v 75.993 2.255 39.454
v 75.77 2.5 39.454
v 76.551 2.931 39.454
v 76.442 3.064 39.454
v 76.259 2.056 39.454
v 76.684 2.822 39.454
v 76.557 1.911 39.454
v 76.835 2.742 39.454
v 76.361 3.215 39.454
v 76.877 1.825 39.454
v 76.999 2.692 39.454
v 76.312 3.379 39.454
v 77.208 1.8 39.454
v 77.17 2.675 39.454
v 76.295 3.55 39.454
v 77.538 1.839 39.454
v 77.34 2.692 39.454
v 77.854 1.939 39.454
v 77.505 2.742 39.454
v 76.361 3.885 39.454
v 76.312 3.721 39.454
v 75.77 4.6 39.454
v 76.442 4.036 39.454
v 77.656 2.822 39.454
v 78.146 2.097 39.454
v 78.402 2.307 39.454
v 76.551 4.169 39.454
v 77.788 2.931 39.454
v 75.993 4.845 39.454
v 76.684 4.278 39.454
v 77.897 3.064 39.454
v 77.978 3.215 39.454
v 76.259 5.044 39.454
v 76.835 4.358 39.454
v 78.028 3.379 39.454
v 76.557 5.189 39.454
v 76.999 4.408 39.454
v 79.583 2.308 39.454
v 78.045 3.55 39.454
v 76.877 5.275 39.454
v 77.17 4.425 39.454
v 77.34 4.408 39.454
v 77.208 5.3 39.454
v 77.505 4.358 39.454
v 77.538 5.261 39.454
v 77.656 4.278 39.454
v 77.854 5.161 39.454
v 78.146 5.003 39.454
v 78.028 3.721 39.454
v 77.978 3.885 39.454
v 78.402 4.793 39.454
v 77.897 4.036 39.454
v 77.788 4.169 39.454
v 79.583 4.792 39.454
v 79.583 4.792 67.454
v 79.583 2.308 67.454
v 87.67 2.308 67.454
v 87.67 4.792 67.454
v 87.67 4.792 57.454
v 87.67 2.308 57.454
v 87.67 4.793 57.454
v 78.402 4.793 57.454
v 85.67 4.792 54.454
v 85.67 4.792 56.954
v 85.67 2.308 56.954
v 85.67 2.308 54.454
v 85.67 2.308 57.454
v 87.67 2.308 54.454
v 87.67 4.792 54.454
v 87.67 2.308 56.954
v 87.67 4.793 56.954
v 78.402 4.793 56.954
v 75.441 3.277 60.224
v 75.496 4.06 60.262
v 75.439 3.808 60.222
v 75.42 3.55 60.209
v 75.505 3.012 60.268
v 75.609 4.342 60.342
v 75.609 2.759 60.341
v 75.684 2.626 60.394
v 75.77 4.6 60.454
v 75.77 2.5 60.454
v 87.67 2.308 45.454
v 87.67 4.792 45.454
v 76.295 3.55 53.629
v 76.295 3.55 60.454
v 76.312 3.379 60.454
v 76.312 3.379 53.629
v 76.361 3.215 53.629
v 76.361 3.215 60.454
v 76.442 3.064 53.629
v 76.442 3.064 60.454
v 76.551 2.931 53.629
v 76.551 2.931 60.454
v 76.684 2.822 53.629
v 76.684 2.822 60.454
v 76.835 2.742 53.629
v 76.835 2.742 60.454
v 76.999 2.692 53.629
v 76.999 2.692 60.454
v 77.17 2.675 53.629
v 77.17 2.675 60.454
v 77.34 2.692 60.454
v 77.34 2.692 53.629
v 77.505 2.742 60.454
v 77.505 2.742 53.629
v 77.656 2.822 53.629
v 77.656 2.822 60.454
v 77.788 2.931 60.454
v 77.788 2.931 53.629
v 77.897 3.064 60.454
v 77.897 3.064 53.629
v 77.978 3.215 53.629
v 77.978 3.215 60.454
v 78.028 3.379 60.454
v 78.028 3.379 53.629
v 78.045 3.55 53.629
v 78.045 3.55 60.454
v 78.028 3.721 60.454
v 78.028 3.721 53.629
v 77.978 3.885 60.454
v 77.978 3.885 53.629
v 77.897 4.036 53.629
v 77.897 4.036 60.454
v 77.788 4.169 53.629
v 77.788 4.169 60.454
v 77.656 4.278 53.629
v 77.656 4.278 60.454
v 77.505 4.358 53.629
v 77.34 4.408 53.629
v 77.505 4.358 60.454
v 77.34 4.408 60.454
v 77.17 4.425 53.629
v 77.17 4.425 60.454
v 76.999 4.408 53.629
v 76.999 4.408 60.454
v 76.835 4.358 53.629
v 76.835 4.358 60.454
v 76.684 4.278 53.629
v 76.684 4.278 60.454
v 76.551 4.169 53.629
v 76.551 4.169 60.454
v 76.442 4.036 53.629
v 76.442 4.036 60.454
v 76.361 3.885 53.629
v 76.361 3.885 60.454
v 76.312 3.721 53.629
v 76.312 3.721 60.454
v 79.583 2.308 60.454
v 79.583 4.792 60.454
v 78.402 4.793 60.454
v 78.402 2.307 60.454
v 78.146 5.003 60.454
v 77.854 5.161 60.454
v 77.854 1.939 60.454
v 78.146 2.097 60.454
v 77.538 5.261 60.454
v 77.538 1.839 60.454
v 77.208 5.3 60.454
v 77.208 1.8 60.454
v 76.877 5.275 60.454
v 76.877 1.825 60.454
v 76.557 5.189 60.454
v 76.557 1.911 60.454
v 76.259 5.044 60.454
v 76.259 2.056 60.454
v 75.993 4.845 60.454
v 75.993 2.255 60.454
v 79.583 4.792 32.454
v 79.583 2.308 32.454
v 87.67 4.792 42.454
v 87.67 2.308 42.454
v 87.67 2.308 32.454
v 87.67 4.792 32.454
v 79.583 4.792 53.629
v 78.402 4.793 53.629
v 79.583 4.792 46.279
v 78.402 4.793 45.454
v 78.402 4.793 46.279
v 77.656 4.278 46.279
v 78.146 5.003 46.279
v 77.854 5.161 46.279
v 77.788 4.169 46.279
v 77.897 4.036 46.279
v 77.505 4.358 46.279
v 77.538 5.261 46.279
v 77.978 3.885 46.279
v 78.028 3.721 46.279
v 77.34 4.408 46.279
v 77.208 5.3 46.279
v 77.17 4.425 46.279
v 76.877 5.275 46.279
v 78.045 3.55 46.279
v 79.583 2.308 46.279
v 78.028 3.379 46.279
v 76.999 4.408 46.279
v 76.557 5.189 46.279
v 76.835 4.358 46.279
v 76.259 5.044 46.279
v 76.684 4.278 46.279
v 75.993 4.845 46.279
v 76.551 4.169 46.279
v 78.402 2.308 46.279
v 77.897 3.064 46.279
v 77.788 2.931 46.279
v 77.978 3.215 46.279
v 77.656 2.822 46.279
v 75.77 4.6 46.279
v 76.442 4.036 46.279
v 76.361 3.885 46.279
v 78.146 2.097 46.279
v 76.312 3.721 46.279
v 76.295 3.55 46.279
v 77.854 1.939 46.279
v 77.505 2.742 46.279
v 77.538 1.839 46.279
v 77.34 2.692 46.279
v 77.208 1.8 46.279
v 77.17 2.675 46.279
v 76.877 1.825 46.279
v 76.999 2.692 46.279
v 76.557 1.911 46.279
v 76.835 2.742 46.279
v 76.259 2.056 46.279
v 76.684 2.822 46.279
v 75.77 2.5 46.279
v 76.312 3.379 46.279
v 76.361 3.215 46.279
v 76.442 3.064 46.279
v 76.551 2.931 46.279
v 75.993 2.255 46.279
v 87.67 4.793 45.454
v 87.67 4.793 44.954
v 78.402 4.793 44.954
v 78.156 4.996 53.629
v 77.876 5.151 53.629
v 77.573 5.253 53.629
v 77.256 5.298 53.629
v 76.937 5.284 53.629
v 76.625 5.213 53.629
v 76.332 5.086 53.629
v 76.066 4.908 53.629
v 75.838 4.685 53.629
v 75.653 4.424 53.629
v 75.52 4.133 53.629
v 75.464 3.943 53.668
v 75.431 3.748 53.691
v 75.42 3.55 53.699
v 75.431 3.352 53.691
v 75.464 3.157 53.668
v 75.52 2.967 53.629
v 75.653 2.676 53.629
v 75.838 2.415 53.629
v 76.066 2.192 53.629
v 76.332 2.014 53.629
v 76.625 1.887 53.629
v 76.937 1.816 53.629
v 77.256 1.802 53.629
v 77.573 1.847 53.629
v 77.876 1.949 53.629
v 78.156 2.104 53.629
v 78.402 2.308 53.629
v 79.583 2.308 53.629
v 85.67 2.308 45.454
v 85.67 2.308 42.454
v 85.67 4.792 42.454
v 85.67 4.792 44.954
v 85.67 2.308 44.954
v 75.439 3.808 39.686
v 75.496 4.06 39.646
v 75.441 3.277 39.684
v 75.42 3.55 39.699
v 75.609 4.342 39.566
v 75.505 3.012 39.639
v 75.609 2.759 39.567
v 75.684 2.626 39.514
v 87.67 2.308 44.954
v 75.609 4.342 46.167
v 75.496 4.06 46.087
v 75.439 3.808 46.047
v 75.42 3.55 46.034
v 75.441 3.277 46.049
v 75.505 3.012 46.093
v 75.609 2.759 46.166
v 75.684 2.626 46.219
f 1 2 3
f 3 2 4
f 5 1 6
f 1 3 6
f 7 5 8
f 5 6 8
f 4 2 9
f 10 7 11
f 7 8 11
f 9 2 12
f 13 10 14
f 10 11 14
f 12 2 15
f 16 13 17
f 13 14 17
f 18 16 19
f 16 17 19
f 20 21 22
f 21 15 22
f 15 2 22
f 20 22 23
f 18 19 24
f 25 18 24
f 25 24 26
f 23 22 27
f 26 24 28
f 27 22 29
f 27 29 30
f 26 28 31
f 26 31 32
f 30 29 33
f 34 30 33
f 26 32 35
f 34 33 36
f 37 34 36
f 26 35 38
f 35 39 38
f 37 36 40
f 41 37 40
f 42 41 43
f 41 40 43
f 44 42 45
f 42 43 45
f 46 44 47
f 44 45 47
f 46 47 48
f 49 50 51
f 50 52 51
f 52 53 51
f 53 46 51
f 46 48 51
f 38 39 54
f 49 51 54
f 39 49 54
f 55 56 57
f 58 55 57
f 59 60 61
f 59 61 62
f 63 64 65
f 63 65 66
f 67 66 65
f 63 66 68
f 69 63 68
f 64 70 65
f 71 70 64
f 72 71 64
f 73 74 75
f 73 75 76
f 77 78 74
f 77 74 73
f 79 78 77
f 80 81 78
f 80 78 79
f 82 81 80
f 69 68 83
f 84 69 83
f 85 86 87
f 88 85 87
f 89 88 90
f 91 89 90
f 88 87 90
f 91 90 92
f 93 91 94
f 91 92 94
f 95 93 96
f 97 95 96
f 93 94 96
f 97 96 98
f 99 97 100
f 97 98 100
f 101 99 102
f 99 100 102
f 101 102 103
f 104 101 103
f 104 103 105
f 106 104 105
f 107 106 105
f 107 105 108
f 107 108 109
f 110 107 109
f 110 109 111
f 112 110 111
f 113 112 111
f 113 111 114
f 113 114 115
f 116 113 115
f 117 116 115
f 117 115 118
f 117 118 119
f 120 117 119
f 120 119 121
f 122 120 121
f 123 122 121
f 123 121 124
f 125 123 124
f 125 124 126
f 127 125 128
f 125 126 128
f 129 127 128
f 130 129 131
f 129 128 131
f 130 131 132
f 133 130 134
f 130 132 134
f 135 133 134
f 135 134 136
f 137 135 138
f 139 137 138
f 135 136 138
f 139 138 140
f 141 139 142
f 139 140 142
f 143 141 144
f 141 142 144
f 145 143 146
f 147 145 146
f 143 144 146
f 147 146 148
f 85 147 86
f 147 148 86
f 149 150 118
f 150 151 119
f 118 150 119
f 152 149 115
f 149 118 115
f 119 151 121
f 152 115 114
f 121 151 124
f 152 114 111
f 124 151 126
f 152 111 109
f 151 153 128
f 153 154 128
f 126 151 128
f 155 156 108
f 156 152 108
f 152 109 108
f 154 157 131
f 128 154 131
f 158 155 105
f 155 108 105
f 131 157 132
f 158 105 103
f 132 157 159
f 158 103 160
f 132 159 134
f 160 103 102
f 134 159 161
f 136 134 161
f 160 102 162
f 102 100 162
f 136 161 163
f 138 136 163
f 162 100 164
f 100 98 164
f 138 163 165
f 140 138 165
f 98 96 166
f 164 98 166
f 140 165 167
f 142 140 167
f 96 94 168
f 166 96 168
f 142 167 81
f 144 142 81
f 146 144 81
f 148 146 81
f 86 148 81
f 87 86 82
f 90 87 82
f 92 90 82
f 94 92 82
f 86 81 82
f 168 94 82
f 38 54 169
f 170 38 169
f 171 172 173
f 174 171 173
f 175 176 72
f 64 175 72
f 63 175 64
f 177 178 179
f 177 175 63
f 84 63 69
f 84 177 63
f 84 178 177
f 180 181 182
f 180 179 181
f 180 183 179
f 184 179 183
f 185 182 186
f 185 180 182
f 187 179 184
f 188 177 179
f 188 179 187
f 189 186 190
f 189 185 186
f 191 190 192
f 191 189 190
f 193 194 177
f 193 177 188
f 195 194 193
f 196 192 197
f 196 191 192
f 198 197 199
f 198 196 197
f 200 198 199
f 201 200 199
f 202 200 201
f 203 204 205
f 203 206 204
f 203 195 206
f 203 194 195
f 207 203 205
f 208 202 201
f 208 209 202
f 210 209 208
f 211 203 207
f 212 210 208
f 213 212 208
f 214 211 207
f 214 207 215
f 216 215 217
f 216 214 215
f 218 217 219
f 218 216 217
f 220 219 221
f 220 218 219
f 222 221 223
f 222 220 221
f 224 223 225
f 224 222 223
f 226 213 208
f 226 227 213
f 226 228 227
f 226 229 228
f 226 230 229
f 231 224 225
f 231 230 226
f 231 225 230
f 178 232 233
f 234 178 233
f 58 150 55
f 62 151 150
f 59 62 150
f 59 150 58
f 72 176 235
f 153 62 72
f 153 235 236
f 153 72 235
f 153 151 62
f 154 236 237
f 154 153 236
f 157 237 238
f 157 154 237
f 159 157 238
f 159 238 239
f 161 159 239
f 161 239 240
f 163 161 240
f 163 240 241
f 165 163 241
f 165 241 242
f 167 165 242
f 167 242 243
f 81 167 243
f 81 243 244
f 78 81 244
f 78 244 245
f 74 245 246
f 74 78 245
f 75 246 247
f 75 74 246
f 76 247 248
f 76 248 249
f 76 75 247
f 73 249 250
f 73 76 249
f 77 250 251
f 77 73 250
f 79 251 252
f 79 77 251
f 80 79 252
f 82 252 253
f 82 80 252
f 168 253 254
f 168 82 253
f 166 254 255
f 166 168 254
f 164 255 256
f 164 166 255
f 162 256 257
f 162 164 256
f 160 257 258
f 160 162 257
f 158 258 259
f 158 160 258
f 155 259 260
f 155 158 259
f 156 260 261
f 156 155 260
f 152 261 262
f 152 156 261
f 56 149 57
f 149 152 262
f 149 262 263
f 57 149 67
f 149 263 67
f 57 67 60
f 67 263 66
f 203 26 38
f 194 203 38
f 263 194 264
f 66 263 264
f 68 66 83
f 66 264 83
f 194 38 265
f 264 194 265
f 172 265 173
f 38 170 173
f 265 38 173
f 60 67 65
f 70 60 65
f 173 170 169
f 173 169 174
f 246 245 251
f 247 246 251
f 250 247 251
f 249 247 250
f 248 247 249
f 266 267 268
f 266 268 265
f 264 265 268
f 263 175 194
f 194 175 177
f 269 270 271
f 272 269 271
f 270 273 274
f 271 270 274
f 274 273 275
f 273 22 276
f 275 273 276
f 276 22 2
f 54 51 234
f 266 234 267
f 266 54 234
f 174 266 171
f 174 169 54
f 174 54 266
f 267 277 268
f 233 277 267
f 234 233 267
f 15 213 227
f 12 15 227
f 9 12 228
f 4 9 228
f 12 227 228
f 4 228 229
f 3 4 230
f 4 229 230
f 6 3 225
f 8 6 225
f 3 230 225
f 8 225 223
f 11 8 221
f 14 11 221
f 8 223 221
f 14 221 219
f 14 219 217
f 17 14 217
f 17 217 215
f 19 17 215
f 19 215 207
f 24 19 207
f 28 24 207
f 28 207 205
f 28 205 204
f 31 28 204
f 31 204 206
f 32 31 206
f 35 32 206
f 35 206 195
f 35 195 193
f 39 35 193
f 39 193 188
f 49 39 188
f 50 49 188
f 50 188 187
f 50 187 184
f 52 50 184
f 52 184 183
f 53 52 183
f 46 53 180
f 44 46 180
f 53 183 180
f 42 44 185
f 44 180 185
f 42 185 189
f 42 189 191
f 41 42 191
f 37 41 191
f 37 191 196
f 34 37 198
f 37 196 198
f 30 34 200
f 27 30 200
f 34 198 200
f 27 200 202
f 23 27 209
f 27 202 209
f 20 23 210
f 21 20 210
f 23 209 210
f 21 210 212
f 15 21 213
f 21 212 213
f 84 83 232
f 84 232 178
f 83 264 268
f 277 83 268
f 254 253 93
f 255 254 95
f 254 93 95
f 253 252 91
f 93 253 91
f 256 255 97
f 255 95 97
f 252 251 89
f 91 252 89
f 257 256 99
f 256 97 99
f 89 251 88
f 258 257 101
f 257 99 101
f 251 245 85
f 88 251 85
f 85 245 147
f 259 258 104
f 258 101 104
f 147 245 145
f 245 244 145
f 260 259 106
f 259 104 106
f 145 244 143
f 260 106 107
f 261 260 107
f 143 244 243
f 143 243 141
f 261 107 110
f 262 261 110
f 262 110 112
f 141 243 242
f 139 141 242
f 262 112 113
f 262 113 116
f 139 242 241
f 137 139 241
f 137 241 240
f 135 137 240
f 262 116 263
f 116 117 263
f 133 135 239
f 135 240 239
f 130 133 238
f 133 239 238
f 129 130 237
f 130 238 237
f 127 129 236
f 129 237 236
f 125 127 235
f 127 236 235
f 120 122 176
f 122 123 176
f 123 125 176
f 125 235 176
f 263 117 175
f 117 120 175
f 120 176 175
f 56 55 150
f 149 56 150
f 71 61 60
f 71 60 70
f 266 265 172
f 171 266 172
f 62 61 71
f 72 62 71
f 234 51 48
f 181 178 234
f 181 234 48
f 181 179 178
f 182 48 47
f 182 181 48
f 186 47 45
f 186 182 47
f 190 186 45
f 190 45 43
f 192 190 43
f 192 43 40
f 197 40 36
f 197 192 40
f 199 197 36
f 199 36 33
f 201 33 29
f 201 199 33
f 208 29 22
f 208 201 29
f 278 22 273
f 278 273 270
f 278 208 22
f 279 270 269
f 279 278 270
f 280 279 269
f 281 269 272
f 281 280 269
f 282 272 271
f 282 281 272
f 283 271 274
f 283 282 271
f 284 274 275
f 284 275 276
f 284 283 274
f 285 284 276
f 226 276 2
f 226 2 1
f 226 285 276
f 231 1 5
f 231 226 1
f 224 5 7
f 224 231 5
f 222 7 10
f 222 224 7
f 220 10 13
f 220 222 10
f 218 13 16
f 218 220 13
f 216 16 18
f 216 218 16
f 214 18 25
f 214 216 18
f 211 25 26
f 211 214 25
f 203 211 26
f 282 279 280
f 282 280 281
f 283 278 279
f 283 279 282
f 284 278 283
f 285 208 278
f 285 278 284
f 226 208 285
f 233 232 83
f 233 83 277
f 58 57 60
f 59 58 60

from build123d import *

# Parameters (mm, degrees)
SKETCH5_W                = 30
SKETCH5_H                = 100
BOSS_EXTRUDE2_DEPTH      = 7.1
SKETCH7_W                = 6.895
SKETCH7_H                = 20
SKETCH7_H_2              = 21
CUT_EXTRUDE2_DEPTH       = 140.379819119
SKETCH8_W                = 60
SKETCH8_H                = 5
SPLIT2_SURFACE_1_BACK    = 107.419
SPLIT2_SURFACE_1_DEPTH   = 214.838
SKETCH10_R               = 2.5
CUT_EXTRUDE5_DEPTH       = 20
CUT_EXTRUDE5_DEPTH_BACK  = 67
CUT_EXTRUDE7_DEPTH       = 140.461200617
CUT_EXTRUDE7_DEPTH_BACK  = 140.461200617
SKETCH41_W               = 15.603241914
SKETCH41_H               = 21
CUT_EXTRUDE9_DEPTH       = 140.461200617
CUT_EXTRUDE9_DEPTH_BACK  = 140.461200617
SCALE1_SCALE             = 0.35
SKETCH46_W               = 2
SKETCH46_H               = 3
CUT_EXTRUDE10_DEPTH      = 111.657018213
CUT_EXTRUDE10_DEPTH_BACK = 111.657018213
BOSS_EXTRUDE3_REACH      = 70.762
SKETCH47_W               = 0.5
SKETCH47_H               = 2.485


with BuildPart() as part:
    # Sketch5 → Boss-Extrude2 (new body)
    with BuildSketch(Plane(origin=(0, 0, 0), x_dir=(1, 0, 0), z_dir=(0, 1, 0))):
        with Locations((81.879400831, -49.953517558)):
            Rectangle(SKETCH5_W, SKETCH5_H)
    extrude(amount=BOSS_EXTRUDE2_DEPTH)

    # Sketch7 → Cut-Extrude2 (cut, through all)
    with BuildSketch(Plane(origin=(0, 7.1, 0), x_dir=(1, 0, 0), z_dir=(0, 1, 0))):
        with Locations((70.326900831, -9.953517558)):
            Rectangle(SKETCH7_W, SKETCH7_H)
        with Locations((70.326900831, -49.953517558)):
            Rectangle(SKETCH7_W, SKETCH7_H_2)
        with Locations((70.326900831, -89.953517558)):
            Rectangle(SKETCH7_W, SKETCH7_H)
    extrude(amount=-CUT_EXTRUDE2_DEPTH, mode=Mode.SUBTRACT)

    # Sketch8 → Revolve-Thin2 (revolve)
    with BuildSketch(Plane.ZY.offset(-66.879400831), mode=Mode.PRIVATE) as revolve_thin2_sk:
        with Locations((49.953517558, 6.05)):
            Rectangle(SKETCH8_W, SKETCH8_H)
    revolve(revolve_thin2_sk.sketch.rotate(Axis((66.879400831, 3.55, 19.953517558), (0, 0, 1)), 315.234915329), axis=Axis((66.879400831, 3.55, 19.953517558), (0, 0, 1)))

    # Split2: cut with a surface, the side behind it stays
    # Split2 surface: a surface, the sketch's curves swept straight by 214.838 mm
    with BuildLine(Plane(origin=(0, 7.1, 0), x_dir=(1, 0, 0), z_dir=(0, 1, 0)).offset(-SPLIT2_SURFACE_1_BACK), mode=Mode.PRIVATE) as split2_surface_1_path:
        Line((71.879400831, -39.453517558), (61.879400831, -39.453517558))
        Line((61.879400831, -39.453517558), (61.879400831, -59.953517558))
        Line((61.879400831, -59.953517558), (71.879400831, -59.953517558))
        Line((71.879400831, -59.953517558), (71.879400831, -39.453517558))
    split2_surface_1 = Shell.extrude(split2_surface_1_path.wire(), (0 * SPLIT2_SURFACE_1_DEPTH, 1 * SPLIT2_SURFACE_1_DEPTH, 0 * SPLIT2_SURFACE_1_DEPTH))
    split(bisect_by=split2_surface_1, keep=Keep.BOTTOM)

    # Sketch10 → Cut-Extrude5 (cut, two sides)
    with BuildSketch(Plane.XY.offset(79.953517558)) as cut_extrude5_sk:
        with Locations(Location((66.879400831, 3.55, 0), (0, 0, 180))):
            Circle(SKETCH10_R)
    extrude(amount=CUT_EXTRUDE5_DEPTH, mode=Mode.SUBTRACT)
    extrude(cut_extrude5_sk.sketch, amount=-CUT_EXTRUDE5_DEPTH_BACK, mode=Mode.SUBTRACT)

    # Sketch36 → Cut-Extrude7 (cut, two sides)
    with BuildSketch(Plane(origin=(0, 0, 0), x_dir=(1, 0, 0), z_dir=(0, 1, 0))) as cut_extrude7_sk:
        Polygon((62.879400831, -39.453517558), (61.879400831, -38.753517558), (61.879400831, -39.453517558), align=None)
        Polygon((61.879400831, -59.953517558), (62.879400831, -59.953517558), (61.879400831, -60.653517558), align=None)
        Polygon((62.879400831, -79.953517558), (61.879400831, -79.253517558), (61.879400831, -79.953517558), align=None)
        Polygon((61.879400831, -19.953517558), (62.879400831, -19.953517558), (61.879400831, -20.653517558), align=None)
    extrude(amount=CUT_EXTRUDE7_DEPTH, mode=Mode.SUBTRACT)
    extrude(cut_extrude7_sk.sketch, amount=-CUT_EXTRUDE7_DEPTH_BACK, mode=Mode.SUBTRACT)

    # Sketch41 → Cut-Extrude9 (cut, two sides)
    with BuildSketch(Plane(origin=(0, 7.1, 0), x_dir=(1, 0, 0), z_dir=(0, 1, 0))) as cut_extrude9_sk:
        with Locations((65.972779874, -49.953517558)):
            Rectangle(SKETCH41_W, SKETCH41_H)
    extrude(amount=CUT_EXTRUDE9_DEPTH, mode=Mode.SUBTRACT)
    extrude(cut_extrude9_sk.sketch, amount=-CUT_EXTRUDE9_DEPTH_BACK, mode=Mode.SUBTRACT)


with BuildPart() as part_1:
    # Scale1: scaled about (82.710750678, 3.55, 49.954128315)
    add(part.part.scale(SCALE1_SCALE).moved(Location((53.761987941, 2.3075, 32.470183405))))

    # Sketch46 → Cut-Extrude10 (cut, two sides)
    with BuildSketch(Plane(origin=(0, 4.792503371, 0), x_dir=(1, 0, 0), z_dir=(0, 1, 0))) as cut_extrude10_sk:
        with Locations((86.669801184, -43.953922739)):
            Rectangle(SKETCH46_W, SKETCH46_H)
        with Locations((86.669801184, -55.953922739)):
            Rectangle(SKETCH46_W, SKETCH46_H)
    extrude(amount=CUT_EXTRUDE10_DEPTH, mode=Mode.SUBTRACT)
    extrude(cut_extrude10_sk.sketch, amount=-CUT_EXTRUDE10_DEPTH_BACK, mode=Mode.SUBTRACT)

    # Sketch47 → Boss-Extrude3 (add, up to next)
    with BuildSketch(Plane(origin=(87.669801184, 0, 0), x_dir=(0, 0, -1), z_dir=(1, 0, 0)), mode=Mode.PRIVATE) as boss_extrude3_sk1:
        with Locations((-57.203922739, 3.550003371)):
            Rectangle(SKETCH47_W, SKETCH47_H)
    boss_extrude3_tool1 = extrude(boss_extrude3_sk1.sketch, amount=-BOSS_EXTRUDE3_REACH, mode=Mode.PRIVATE) - part_1.part
    # Sketch47 → Boss-Extrude3 (add, up to next)
    with BuildSketch(Plane(origin=(87.669801184, 0, 0), x_dir=(0, 0, -1), z_dir=(1, 0, 0)), mode=Mode.PRIVATE) as boss_extrude3_sk2:
        with Locations((-45.203922739, 3.550003371)):
            Rectangle(SKETCH47_W, SKETCH47_H)
    boss_extrude3_tool2 = extrude(boss_extrude3_sk2.sketch, amount=-BOSS_EXTRUDE3_REACH, mode=Mode.PRIVATE) - part_1.part
    add(boss_extrude3_tool1.solids().sort_by_distance((87.669801, 3.550003, 57.203923))[0])
    add(boss_extrude3_tool2.solids().sort_by_distance((87.669801, 3.550003, 45.203923))[0])


solid = part_1.part
